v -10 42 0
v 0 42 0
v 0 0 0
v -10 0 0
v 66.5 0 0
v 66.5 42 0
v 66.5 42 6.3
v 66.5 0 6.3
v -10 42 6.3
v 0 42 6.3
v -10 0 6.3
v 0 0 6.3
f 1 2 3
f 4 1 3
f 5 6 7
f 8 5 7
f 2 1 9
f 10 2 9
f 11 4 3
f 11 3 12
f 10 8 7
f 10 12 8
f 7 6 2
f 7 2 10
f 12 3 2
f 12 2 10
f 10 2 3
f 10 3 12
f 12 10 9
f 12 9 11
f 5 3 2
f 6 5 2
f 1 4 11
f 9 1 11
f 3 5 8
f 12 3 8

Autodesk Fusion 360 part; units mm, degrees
sketch "Sketch8" plane through (0, 0, 6.3) normal (0, 0, 1) x (-1, 0, 0)
sketch "Sketch10" plane through (0, 0, 6.3) normal (0, 0, 1) x (-1, 0, 0)
sketch "Sketch11" plane through (0, 0, 0) normal (0, -1, 0) x (1, 0, 0)
sketch "Sketch12" plane through (0, 0, 0) normal (0, 0, -1) x (1, 0, 0)
sketch "Sketch13" plane through (0, 42, 0) normal (0, 1, 0) x (-1, 0, 0)
box "BoxPrimitive9" add length 42 width 66.5 height 6.3 placed x (0, 1, 0) y (-1, 0, 0) z (0, 0, 1) at (66.5, 0, 0) makes body 1
box "BoxPrimitive10" add length 42 width 10 height -6.3 placed x (0, -1, 0) y (1, 0, 0) z (0, 0, 1) at (-10, 42, 6.3) separate body makes body 2
copy_body "Body->Comp1" bodies 2 removing the originals makes body 3 in component "Component'"
copy_body "Body->Comp2" bodies 1 removing the originals makes body 4 in component "Component''"
component "Component" placed x (1, 0, 0) y (0, 1, 0) z (0, 0, 1) at (0, 0, 0)
component "Component'" placed x (1, 0, 0) y (0, 1, 0) z (0, 0, 1) at (0, 0, 0)
component "Component''" placed x (1, 0, 0) y (0, 1, 0) z (0, 0, 1) at (0, 0, 0)
